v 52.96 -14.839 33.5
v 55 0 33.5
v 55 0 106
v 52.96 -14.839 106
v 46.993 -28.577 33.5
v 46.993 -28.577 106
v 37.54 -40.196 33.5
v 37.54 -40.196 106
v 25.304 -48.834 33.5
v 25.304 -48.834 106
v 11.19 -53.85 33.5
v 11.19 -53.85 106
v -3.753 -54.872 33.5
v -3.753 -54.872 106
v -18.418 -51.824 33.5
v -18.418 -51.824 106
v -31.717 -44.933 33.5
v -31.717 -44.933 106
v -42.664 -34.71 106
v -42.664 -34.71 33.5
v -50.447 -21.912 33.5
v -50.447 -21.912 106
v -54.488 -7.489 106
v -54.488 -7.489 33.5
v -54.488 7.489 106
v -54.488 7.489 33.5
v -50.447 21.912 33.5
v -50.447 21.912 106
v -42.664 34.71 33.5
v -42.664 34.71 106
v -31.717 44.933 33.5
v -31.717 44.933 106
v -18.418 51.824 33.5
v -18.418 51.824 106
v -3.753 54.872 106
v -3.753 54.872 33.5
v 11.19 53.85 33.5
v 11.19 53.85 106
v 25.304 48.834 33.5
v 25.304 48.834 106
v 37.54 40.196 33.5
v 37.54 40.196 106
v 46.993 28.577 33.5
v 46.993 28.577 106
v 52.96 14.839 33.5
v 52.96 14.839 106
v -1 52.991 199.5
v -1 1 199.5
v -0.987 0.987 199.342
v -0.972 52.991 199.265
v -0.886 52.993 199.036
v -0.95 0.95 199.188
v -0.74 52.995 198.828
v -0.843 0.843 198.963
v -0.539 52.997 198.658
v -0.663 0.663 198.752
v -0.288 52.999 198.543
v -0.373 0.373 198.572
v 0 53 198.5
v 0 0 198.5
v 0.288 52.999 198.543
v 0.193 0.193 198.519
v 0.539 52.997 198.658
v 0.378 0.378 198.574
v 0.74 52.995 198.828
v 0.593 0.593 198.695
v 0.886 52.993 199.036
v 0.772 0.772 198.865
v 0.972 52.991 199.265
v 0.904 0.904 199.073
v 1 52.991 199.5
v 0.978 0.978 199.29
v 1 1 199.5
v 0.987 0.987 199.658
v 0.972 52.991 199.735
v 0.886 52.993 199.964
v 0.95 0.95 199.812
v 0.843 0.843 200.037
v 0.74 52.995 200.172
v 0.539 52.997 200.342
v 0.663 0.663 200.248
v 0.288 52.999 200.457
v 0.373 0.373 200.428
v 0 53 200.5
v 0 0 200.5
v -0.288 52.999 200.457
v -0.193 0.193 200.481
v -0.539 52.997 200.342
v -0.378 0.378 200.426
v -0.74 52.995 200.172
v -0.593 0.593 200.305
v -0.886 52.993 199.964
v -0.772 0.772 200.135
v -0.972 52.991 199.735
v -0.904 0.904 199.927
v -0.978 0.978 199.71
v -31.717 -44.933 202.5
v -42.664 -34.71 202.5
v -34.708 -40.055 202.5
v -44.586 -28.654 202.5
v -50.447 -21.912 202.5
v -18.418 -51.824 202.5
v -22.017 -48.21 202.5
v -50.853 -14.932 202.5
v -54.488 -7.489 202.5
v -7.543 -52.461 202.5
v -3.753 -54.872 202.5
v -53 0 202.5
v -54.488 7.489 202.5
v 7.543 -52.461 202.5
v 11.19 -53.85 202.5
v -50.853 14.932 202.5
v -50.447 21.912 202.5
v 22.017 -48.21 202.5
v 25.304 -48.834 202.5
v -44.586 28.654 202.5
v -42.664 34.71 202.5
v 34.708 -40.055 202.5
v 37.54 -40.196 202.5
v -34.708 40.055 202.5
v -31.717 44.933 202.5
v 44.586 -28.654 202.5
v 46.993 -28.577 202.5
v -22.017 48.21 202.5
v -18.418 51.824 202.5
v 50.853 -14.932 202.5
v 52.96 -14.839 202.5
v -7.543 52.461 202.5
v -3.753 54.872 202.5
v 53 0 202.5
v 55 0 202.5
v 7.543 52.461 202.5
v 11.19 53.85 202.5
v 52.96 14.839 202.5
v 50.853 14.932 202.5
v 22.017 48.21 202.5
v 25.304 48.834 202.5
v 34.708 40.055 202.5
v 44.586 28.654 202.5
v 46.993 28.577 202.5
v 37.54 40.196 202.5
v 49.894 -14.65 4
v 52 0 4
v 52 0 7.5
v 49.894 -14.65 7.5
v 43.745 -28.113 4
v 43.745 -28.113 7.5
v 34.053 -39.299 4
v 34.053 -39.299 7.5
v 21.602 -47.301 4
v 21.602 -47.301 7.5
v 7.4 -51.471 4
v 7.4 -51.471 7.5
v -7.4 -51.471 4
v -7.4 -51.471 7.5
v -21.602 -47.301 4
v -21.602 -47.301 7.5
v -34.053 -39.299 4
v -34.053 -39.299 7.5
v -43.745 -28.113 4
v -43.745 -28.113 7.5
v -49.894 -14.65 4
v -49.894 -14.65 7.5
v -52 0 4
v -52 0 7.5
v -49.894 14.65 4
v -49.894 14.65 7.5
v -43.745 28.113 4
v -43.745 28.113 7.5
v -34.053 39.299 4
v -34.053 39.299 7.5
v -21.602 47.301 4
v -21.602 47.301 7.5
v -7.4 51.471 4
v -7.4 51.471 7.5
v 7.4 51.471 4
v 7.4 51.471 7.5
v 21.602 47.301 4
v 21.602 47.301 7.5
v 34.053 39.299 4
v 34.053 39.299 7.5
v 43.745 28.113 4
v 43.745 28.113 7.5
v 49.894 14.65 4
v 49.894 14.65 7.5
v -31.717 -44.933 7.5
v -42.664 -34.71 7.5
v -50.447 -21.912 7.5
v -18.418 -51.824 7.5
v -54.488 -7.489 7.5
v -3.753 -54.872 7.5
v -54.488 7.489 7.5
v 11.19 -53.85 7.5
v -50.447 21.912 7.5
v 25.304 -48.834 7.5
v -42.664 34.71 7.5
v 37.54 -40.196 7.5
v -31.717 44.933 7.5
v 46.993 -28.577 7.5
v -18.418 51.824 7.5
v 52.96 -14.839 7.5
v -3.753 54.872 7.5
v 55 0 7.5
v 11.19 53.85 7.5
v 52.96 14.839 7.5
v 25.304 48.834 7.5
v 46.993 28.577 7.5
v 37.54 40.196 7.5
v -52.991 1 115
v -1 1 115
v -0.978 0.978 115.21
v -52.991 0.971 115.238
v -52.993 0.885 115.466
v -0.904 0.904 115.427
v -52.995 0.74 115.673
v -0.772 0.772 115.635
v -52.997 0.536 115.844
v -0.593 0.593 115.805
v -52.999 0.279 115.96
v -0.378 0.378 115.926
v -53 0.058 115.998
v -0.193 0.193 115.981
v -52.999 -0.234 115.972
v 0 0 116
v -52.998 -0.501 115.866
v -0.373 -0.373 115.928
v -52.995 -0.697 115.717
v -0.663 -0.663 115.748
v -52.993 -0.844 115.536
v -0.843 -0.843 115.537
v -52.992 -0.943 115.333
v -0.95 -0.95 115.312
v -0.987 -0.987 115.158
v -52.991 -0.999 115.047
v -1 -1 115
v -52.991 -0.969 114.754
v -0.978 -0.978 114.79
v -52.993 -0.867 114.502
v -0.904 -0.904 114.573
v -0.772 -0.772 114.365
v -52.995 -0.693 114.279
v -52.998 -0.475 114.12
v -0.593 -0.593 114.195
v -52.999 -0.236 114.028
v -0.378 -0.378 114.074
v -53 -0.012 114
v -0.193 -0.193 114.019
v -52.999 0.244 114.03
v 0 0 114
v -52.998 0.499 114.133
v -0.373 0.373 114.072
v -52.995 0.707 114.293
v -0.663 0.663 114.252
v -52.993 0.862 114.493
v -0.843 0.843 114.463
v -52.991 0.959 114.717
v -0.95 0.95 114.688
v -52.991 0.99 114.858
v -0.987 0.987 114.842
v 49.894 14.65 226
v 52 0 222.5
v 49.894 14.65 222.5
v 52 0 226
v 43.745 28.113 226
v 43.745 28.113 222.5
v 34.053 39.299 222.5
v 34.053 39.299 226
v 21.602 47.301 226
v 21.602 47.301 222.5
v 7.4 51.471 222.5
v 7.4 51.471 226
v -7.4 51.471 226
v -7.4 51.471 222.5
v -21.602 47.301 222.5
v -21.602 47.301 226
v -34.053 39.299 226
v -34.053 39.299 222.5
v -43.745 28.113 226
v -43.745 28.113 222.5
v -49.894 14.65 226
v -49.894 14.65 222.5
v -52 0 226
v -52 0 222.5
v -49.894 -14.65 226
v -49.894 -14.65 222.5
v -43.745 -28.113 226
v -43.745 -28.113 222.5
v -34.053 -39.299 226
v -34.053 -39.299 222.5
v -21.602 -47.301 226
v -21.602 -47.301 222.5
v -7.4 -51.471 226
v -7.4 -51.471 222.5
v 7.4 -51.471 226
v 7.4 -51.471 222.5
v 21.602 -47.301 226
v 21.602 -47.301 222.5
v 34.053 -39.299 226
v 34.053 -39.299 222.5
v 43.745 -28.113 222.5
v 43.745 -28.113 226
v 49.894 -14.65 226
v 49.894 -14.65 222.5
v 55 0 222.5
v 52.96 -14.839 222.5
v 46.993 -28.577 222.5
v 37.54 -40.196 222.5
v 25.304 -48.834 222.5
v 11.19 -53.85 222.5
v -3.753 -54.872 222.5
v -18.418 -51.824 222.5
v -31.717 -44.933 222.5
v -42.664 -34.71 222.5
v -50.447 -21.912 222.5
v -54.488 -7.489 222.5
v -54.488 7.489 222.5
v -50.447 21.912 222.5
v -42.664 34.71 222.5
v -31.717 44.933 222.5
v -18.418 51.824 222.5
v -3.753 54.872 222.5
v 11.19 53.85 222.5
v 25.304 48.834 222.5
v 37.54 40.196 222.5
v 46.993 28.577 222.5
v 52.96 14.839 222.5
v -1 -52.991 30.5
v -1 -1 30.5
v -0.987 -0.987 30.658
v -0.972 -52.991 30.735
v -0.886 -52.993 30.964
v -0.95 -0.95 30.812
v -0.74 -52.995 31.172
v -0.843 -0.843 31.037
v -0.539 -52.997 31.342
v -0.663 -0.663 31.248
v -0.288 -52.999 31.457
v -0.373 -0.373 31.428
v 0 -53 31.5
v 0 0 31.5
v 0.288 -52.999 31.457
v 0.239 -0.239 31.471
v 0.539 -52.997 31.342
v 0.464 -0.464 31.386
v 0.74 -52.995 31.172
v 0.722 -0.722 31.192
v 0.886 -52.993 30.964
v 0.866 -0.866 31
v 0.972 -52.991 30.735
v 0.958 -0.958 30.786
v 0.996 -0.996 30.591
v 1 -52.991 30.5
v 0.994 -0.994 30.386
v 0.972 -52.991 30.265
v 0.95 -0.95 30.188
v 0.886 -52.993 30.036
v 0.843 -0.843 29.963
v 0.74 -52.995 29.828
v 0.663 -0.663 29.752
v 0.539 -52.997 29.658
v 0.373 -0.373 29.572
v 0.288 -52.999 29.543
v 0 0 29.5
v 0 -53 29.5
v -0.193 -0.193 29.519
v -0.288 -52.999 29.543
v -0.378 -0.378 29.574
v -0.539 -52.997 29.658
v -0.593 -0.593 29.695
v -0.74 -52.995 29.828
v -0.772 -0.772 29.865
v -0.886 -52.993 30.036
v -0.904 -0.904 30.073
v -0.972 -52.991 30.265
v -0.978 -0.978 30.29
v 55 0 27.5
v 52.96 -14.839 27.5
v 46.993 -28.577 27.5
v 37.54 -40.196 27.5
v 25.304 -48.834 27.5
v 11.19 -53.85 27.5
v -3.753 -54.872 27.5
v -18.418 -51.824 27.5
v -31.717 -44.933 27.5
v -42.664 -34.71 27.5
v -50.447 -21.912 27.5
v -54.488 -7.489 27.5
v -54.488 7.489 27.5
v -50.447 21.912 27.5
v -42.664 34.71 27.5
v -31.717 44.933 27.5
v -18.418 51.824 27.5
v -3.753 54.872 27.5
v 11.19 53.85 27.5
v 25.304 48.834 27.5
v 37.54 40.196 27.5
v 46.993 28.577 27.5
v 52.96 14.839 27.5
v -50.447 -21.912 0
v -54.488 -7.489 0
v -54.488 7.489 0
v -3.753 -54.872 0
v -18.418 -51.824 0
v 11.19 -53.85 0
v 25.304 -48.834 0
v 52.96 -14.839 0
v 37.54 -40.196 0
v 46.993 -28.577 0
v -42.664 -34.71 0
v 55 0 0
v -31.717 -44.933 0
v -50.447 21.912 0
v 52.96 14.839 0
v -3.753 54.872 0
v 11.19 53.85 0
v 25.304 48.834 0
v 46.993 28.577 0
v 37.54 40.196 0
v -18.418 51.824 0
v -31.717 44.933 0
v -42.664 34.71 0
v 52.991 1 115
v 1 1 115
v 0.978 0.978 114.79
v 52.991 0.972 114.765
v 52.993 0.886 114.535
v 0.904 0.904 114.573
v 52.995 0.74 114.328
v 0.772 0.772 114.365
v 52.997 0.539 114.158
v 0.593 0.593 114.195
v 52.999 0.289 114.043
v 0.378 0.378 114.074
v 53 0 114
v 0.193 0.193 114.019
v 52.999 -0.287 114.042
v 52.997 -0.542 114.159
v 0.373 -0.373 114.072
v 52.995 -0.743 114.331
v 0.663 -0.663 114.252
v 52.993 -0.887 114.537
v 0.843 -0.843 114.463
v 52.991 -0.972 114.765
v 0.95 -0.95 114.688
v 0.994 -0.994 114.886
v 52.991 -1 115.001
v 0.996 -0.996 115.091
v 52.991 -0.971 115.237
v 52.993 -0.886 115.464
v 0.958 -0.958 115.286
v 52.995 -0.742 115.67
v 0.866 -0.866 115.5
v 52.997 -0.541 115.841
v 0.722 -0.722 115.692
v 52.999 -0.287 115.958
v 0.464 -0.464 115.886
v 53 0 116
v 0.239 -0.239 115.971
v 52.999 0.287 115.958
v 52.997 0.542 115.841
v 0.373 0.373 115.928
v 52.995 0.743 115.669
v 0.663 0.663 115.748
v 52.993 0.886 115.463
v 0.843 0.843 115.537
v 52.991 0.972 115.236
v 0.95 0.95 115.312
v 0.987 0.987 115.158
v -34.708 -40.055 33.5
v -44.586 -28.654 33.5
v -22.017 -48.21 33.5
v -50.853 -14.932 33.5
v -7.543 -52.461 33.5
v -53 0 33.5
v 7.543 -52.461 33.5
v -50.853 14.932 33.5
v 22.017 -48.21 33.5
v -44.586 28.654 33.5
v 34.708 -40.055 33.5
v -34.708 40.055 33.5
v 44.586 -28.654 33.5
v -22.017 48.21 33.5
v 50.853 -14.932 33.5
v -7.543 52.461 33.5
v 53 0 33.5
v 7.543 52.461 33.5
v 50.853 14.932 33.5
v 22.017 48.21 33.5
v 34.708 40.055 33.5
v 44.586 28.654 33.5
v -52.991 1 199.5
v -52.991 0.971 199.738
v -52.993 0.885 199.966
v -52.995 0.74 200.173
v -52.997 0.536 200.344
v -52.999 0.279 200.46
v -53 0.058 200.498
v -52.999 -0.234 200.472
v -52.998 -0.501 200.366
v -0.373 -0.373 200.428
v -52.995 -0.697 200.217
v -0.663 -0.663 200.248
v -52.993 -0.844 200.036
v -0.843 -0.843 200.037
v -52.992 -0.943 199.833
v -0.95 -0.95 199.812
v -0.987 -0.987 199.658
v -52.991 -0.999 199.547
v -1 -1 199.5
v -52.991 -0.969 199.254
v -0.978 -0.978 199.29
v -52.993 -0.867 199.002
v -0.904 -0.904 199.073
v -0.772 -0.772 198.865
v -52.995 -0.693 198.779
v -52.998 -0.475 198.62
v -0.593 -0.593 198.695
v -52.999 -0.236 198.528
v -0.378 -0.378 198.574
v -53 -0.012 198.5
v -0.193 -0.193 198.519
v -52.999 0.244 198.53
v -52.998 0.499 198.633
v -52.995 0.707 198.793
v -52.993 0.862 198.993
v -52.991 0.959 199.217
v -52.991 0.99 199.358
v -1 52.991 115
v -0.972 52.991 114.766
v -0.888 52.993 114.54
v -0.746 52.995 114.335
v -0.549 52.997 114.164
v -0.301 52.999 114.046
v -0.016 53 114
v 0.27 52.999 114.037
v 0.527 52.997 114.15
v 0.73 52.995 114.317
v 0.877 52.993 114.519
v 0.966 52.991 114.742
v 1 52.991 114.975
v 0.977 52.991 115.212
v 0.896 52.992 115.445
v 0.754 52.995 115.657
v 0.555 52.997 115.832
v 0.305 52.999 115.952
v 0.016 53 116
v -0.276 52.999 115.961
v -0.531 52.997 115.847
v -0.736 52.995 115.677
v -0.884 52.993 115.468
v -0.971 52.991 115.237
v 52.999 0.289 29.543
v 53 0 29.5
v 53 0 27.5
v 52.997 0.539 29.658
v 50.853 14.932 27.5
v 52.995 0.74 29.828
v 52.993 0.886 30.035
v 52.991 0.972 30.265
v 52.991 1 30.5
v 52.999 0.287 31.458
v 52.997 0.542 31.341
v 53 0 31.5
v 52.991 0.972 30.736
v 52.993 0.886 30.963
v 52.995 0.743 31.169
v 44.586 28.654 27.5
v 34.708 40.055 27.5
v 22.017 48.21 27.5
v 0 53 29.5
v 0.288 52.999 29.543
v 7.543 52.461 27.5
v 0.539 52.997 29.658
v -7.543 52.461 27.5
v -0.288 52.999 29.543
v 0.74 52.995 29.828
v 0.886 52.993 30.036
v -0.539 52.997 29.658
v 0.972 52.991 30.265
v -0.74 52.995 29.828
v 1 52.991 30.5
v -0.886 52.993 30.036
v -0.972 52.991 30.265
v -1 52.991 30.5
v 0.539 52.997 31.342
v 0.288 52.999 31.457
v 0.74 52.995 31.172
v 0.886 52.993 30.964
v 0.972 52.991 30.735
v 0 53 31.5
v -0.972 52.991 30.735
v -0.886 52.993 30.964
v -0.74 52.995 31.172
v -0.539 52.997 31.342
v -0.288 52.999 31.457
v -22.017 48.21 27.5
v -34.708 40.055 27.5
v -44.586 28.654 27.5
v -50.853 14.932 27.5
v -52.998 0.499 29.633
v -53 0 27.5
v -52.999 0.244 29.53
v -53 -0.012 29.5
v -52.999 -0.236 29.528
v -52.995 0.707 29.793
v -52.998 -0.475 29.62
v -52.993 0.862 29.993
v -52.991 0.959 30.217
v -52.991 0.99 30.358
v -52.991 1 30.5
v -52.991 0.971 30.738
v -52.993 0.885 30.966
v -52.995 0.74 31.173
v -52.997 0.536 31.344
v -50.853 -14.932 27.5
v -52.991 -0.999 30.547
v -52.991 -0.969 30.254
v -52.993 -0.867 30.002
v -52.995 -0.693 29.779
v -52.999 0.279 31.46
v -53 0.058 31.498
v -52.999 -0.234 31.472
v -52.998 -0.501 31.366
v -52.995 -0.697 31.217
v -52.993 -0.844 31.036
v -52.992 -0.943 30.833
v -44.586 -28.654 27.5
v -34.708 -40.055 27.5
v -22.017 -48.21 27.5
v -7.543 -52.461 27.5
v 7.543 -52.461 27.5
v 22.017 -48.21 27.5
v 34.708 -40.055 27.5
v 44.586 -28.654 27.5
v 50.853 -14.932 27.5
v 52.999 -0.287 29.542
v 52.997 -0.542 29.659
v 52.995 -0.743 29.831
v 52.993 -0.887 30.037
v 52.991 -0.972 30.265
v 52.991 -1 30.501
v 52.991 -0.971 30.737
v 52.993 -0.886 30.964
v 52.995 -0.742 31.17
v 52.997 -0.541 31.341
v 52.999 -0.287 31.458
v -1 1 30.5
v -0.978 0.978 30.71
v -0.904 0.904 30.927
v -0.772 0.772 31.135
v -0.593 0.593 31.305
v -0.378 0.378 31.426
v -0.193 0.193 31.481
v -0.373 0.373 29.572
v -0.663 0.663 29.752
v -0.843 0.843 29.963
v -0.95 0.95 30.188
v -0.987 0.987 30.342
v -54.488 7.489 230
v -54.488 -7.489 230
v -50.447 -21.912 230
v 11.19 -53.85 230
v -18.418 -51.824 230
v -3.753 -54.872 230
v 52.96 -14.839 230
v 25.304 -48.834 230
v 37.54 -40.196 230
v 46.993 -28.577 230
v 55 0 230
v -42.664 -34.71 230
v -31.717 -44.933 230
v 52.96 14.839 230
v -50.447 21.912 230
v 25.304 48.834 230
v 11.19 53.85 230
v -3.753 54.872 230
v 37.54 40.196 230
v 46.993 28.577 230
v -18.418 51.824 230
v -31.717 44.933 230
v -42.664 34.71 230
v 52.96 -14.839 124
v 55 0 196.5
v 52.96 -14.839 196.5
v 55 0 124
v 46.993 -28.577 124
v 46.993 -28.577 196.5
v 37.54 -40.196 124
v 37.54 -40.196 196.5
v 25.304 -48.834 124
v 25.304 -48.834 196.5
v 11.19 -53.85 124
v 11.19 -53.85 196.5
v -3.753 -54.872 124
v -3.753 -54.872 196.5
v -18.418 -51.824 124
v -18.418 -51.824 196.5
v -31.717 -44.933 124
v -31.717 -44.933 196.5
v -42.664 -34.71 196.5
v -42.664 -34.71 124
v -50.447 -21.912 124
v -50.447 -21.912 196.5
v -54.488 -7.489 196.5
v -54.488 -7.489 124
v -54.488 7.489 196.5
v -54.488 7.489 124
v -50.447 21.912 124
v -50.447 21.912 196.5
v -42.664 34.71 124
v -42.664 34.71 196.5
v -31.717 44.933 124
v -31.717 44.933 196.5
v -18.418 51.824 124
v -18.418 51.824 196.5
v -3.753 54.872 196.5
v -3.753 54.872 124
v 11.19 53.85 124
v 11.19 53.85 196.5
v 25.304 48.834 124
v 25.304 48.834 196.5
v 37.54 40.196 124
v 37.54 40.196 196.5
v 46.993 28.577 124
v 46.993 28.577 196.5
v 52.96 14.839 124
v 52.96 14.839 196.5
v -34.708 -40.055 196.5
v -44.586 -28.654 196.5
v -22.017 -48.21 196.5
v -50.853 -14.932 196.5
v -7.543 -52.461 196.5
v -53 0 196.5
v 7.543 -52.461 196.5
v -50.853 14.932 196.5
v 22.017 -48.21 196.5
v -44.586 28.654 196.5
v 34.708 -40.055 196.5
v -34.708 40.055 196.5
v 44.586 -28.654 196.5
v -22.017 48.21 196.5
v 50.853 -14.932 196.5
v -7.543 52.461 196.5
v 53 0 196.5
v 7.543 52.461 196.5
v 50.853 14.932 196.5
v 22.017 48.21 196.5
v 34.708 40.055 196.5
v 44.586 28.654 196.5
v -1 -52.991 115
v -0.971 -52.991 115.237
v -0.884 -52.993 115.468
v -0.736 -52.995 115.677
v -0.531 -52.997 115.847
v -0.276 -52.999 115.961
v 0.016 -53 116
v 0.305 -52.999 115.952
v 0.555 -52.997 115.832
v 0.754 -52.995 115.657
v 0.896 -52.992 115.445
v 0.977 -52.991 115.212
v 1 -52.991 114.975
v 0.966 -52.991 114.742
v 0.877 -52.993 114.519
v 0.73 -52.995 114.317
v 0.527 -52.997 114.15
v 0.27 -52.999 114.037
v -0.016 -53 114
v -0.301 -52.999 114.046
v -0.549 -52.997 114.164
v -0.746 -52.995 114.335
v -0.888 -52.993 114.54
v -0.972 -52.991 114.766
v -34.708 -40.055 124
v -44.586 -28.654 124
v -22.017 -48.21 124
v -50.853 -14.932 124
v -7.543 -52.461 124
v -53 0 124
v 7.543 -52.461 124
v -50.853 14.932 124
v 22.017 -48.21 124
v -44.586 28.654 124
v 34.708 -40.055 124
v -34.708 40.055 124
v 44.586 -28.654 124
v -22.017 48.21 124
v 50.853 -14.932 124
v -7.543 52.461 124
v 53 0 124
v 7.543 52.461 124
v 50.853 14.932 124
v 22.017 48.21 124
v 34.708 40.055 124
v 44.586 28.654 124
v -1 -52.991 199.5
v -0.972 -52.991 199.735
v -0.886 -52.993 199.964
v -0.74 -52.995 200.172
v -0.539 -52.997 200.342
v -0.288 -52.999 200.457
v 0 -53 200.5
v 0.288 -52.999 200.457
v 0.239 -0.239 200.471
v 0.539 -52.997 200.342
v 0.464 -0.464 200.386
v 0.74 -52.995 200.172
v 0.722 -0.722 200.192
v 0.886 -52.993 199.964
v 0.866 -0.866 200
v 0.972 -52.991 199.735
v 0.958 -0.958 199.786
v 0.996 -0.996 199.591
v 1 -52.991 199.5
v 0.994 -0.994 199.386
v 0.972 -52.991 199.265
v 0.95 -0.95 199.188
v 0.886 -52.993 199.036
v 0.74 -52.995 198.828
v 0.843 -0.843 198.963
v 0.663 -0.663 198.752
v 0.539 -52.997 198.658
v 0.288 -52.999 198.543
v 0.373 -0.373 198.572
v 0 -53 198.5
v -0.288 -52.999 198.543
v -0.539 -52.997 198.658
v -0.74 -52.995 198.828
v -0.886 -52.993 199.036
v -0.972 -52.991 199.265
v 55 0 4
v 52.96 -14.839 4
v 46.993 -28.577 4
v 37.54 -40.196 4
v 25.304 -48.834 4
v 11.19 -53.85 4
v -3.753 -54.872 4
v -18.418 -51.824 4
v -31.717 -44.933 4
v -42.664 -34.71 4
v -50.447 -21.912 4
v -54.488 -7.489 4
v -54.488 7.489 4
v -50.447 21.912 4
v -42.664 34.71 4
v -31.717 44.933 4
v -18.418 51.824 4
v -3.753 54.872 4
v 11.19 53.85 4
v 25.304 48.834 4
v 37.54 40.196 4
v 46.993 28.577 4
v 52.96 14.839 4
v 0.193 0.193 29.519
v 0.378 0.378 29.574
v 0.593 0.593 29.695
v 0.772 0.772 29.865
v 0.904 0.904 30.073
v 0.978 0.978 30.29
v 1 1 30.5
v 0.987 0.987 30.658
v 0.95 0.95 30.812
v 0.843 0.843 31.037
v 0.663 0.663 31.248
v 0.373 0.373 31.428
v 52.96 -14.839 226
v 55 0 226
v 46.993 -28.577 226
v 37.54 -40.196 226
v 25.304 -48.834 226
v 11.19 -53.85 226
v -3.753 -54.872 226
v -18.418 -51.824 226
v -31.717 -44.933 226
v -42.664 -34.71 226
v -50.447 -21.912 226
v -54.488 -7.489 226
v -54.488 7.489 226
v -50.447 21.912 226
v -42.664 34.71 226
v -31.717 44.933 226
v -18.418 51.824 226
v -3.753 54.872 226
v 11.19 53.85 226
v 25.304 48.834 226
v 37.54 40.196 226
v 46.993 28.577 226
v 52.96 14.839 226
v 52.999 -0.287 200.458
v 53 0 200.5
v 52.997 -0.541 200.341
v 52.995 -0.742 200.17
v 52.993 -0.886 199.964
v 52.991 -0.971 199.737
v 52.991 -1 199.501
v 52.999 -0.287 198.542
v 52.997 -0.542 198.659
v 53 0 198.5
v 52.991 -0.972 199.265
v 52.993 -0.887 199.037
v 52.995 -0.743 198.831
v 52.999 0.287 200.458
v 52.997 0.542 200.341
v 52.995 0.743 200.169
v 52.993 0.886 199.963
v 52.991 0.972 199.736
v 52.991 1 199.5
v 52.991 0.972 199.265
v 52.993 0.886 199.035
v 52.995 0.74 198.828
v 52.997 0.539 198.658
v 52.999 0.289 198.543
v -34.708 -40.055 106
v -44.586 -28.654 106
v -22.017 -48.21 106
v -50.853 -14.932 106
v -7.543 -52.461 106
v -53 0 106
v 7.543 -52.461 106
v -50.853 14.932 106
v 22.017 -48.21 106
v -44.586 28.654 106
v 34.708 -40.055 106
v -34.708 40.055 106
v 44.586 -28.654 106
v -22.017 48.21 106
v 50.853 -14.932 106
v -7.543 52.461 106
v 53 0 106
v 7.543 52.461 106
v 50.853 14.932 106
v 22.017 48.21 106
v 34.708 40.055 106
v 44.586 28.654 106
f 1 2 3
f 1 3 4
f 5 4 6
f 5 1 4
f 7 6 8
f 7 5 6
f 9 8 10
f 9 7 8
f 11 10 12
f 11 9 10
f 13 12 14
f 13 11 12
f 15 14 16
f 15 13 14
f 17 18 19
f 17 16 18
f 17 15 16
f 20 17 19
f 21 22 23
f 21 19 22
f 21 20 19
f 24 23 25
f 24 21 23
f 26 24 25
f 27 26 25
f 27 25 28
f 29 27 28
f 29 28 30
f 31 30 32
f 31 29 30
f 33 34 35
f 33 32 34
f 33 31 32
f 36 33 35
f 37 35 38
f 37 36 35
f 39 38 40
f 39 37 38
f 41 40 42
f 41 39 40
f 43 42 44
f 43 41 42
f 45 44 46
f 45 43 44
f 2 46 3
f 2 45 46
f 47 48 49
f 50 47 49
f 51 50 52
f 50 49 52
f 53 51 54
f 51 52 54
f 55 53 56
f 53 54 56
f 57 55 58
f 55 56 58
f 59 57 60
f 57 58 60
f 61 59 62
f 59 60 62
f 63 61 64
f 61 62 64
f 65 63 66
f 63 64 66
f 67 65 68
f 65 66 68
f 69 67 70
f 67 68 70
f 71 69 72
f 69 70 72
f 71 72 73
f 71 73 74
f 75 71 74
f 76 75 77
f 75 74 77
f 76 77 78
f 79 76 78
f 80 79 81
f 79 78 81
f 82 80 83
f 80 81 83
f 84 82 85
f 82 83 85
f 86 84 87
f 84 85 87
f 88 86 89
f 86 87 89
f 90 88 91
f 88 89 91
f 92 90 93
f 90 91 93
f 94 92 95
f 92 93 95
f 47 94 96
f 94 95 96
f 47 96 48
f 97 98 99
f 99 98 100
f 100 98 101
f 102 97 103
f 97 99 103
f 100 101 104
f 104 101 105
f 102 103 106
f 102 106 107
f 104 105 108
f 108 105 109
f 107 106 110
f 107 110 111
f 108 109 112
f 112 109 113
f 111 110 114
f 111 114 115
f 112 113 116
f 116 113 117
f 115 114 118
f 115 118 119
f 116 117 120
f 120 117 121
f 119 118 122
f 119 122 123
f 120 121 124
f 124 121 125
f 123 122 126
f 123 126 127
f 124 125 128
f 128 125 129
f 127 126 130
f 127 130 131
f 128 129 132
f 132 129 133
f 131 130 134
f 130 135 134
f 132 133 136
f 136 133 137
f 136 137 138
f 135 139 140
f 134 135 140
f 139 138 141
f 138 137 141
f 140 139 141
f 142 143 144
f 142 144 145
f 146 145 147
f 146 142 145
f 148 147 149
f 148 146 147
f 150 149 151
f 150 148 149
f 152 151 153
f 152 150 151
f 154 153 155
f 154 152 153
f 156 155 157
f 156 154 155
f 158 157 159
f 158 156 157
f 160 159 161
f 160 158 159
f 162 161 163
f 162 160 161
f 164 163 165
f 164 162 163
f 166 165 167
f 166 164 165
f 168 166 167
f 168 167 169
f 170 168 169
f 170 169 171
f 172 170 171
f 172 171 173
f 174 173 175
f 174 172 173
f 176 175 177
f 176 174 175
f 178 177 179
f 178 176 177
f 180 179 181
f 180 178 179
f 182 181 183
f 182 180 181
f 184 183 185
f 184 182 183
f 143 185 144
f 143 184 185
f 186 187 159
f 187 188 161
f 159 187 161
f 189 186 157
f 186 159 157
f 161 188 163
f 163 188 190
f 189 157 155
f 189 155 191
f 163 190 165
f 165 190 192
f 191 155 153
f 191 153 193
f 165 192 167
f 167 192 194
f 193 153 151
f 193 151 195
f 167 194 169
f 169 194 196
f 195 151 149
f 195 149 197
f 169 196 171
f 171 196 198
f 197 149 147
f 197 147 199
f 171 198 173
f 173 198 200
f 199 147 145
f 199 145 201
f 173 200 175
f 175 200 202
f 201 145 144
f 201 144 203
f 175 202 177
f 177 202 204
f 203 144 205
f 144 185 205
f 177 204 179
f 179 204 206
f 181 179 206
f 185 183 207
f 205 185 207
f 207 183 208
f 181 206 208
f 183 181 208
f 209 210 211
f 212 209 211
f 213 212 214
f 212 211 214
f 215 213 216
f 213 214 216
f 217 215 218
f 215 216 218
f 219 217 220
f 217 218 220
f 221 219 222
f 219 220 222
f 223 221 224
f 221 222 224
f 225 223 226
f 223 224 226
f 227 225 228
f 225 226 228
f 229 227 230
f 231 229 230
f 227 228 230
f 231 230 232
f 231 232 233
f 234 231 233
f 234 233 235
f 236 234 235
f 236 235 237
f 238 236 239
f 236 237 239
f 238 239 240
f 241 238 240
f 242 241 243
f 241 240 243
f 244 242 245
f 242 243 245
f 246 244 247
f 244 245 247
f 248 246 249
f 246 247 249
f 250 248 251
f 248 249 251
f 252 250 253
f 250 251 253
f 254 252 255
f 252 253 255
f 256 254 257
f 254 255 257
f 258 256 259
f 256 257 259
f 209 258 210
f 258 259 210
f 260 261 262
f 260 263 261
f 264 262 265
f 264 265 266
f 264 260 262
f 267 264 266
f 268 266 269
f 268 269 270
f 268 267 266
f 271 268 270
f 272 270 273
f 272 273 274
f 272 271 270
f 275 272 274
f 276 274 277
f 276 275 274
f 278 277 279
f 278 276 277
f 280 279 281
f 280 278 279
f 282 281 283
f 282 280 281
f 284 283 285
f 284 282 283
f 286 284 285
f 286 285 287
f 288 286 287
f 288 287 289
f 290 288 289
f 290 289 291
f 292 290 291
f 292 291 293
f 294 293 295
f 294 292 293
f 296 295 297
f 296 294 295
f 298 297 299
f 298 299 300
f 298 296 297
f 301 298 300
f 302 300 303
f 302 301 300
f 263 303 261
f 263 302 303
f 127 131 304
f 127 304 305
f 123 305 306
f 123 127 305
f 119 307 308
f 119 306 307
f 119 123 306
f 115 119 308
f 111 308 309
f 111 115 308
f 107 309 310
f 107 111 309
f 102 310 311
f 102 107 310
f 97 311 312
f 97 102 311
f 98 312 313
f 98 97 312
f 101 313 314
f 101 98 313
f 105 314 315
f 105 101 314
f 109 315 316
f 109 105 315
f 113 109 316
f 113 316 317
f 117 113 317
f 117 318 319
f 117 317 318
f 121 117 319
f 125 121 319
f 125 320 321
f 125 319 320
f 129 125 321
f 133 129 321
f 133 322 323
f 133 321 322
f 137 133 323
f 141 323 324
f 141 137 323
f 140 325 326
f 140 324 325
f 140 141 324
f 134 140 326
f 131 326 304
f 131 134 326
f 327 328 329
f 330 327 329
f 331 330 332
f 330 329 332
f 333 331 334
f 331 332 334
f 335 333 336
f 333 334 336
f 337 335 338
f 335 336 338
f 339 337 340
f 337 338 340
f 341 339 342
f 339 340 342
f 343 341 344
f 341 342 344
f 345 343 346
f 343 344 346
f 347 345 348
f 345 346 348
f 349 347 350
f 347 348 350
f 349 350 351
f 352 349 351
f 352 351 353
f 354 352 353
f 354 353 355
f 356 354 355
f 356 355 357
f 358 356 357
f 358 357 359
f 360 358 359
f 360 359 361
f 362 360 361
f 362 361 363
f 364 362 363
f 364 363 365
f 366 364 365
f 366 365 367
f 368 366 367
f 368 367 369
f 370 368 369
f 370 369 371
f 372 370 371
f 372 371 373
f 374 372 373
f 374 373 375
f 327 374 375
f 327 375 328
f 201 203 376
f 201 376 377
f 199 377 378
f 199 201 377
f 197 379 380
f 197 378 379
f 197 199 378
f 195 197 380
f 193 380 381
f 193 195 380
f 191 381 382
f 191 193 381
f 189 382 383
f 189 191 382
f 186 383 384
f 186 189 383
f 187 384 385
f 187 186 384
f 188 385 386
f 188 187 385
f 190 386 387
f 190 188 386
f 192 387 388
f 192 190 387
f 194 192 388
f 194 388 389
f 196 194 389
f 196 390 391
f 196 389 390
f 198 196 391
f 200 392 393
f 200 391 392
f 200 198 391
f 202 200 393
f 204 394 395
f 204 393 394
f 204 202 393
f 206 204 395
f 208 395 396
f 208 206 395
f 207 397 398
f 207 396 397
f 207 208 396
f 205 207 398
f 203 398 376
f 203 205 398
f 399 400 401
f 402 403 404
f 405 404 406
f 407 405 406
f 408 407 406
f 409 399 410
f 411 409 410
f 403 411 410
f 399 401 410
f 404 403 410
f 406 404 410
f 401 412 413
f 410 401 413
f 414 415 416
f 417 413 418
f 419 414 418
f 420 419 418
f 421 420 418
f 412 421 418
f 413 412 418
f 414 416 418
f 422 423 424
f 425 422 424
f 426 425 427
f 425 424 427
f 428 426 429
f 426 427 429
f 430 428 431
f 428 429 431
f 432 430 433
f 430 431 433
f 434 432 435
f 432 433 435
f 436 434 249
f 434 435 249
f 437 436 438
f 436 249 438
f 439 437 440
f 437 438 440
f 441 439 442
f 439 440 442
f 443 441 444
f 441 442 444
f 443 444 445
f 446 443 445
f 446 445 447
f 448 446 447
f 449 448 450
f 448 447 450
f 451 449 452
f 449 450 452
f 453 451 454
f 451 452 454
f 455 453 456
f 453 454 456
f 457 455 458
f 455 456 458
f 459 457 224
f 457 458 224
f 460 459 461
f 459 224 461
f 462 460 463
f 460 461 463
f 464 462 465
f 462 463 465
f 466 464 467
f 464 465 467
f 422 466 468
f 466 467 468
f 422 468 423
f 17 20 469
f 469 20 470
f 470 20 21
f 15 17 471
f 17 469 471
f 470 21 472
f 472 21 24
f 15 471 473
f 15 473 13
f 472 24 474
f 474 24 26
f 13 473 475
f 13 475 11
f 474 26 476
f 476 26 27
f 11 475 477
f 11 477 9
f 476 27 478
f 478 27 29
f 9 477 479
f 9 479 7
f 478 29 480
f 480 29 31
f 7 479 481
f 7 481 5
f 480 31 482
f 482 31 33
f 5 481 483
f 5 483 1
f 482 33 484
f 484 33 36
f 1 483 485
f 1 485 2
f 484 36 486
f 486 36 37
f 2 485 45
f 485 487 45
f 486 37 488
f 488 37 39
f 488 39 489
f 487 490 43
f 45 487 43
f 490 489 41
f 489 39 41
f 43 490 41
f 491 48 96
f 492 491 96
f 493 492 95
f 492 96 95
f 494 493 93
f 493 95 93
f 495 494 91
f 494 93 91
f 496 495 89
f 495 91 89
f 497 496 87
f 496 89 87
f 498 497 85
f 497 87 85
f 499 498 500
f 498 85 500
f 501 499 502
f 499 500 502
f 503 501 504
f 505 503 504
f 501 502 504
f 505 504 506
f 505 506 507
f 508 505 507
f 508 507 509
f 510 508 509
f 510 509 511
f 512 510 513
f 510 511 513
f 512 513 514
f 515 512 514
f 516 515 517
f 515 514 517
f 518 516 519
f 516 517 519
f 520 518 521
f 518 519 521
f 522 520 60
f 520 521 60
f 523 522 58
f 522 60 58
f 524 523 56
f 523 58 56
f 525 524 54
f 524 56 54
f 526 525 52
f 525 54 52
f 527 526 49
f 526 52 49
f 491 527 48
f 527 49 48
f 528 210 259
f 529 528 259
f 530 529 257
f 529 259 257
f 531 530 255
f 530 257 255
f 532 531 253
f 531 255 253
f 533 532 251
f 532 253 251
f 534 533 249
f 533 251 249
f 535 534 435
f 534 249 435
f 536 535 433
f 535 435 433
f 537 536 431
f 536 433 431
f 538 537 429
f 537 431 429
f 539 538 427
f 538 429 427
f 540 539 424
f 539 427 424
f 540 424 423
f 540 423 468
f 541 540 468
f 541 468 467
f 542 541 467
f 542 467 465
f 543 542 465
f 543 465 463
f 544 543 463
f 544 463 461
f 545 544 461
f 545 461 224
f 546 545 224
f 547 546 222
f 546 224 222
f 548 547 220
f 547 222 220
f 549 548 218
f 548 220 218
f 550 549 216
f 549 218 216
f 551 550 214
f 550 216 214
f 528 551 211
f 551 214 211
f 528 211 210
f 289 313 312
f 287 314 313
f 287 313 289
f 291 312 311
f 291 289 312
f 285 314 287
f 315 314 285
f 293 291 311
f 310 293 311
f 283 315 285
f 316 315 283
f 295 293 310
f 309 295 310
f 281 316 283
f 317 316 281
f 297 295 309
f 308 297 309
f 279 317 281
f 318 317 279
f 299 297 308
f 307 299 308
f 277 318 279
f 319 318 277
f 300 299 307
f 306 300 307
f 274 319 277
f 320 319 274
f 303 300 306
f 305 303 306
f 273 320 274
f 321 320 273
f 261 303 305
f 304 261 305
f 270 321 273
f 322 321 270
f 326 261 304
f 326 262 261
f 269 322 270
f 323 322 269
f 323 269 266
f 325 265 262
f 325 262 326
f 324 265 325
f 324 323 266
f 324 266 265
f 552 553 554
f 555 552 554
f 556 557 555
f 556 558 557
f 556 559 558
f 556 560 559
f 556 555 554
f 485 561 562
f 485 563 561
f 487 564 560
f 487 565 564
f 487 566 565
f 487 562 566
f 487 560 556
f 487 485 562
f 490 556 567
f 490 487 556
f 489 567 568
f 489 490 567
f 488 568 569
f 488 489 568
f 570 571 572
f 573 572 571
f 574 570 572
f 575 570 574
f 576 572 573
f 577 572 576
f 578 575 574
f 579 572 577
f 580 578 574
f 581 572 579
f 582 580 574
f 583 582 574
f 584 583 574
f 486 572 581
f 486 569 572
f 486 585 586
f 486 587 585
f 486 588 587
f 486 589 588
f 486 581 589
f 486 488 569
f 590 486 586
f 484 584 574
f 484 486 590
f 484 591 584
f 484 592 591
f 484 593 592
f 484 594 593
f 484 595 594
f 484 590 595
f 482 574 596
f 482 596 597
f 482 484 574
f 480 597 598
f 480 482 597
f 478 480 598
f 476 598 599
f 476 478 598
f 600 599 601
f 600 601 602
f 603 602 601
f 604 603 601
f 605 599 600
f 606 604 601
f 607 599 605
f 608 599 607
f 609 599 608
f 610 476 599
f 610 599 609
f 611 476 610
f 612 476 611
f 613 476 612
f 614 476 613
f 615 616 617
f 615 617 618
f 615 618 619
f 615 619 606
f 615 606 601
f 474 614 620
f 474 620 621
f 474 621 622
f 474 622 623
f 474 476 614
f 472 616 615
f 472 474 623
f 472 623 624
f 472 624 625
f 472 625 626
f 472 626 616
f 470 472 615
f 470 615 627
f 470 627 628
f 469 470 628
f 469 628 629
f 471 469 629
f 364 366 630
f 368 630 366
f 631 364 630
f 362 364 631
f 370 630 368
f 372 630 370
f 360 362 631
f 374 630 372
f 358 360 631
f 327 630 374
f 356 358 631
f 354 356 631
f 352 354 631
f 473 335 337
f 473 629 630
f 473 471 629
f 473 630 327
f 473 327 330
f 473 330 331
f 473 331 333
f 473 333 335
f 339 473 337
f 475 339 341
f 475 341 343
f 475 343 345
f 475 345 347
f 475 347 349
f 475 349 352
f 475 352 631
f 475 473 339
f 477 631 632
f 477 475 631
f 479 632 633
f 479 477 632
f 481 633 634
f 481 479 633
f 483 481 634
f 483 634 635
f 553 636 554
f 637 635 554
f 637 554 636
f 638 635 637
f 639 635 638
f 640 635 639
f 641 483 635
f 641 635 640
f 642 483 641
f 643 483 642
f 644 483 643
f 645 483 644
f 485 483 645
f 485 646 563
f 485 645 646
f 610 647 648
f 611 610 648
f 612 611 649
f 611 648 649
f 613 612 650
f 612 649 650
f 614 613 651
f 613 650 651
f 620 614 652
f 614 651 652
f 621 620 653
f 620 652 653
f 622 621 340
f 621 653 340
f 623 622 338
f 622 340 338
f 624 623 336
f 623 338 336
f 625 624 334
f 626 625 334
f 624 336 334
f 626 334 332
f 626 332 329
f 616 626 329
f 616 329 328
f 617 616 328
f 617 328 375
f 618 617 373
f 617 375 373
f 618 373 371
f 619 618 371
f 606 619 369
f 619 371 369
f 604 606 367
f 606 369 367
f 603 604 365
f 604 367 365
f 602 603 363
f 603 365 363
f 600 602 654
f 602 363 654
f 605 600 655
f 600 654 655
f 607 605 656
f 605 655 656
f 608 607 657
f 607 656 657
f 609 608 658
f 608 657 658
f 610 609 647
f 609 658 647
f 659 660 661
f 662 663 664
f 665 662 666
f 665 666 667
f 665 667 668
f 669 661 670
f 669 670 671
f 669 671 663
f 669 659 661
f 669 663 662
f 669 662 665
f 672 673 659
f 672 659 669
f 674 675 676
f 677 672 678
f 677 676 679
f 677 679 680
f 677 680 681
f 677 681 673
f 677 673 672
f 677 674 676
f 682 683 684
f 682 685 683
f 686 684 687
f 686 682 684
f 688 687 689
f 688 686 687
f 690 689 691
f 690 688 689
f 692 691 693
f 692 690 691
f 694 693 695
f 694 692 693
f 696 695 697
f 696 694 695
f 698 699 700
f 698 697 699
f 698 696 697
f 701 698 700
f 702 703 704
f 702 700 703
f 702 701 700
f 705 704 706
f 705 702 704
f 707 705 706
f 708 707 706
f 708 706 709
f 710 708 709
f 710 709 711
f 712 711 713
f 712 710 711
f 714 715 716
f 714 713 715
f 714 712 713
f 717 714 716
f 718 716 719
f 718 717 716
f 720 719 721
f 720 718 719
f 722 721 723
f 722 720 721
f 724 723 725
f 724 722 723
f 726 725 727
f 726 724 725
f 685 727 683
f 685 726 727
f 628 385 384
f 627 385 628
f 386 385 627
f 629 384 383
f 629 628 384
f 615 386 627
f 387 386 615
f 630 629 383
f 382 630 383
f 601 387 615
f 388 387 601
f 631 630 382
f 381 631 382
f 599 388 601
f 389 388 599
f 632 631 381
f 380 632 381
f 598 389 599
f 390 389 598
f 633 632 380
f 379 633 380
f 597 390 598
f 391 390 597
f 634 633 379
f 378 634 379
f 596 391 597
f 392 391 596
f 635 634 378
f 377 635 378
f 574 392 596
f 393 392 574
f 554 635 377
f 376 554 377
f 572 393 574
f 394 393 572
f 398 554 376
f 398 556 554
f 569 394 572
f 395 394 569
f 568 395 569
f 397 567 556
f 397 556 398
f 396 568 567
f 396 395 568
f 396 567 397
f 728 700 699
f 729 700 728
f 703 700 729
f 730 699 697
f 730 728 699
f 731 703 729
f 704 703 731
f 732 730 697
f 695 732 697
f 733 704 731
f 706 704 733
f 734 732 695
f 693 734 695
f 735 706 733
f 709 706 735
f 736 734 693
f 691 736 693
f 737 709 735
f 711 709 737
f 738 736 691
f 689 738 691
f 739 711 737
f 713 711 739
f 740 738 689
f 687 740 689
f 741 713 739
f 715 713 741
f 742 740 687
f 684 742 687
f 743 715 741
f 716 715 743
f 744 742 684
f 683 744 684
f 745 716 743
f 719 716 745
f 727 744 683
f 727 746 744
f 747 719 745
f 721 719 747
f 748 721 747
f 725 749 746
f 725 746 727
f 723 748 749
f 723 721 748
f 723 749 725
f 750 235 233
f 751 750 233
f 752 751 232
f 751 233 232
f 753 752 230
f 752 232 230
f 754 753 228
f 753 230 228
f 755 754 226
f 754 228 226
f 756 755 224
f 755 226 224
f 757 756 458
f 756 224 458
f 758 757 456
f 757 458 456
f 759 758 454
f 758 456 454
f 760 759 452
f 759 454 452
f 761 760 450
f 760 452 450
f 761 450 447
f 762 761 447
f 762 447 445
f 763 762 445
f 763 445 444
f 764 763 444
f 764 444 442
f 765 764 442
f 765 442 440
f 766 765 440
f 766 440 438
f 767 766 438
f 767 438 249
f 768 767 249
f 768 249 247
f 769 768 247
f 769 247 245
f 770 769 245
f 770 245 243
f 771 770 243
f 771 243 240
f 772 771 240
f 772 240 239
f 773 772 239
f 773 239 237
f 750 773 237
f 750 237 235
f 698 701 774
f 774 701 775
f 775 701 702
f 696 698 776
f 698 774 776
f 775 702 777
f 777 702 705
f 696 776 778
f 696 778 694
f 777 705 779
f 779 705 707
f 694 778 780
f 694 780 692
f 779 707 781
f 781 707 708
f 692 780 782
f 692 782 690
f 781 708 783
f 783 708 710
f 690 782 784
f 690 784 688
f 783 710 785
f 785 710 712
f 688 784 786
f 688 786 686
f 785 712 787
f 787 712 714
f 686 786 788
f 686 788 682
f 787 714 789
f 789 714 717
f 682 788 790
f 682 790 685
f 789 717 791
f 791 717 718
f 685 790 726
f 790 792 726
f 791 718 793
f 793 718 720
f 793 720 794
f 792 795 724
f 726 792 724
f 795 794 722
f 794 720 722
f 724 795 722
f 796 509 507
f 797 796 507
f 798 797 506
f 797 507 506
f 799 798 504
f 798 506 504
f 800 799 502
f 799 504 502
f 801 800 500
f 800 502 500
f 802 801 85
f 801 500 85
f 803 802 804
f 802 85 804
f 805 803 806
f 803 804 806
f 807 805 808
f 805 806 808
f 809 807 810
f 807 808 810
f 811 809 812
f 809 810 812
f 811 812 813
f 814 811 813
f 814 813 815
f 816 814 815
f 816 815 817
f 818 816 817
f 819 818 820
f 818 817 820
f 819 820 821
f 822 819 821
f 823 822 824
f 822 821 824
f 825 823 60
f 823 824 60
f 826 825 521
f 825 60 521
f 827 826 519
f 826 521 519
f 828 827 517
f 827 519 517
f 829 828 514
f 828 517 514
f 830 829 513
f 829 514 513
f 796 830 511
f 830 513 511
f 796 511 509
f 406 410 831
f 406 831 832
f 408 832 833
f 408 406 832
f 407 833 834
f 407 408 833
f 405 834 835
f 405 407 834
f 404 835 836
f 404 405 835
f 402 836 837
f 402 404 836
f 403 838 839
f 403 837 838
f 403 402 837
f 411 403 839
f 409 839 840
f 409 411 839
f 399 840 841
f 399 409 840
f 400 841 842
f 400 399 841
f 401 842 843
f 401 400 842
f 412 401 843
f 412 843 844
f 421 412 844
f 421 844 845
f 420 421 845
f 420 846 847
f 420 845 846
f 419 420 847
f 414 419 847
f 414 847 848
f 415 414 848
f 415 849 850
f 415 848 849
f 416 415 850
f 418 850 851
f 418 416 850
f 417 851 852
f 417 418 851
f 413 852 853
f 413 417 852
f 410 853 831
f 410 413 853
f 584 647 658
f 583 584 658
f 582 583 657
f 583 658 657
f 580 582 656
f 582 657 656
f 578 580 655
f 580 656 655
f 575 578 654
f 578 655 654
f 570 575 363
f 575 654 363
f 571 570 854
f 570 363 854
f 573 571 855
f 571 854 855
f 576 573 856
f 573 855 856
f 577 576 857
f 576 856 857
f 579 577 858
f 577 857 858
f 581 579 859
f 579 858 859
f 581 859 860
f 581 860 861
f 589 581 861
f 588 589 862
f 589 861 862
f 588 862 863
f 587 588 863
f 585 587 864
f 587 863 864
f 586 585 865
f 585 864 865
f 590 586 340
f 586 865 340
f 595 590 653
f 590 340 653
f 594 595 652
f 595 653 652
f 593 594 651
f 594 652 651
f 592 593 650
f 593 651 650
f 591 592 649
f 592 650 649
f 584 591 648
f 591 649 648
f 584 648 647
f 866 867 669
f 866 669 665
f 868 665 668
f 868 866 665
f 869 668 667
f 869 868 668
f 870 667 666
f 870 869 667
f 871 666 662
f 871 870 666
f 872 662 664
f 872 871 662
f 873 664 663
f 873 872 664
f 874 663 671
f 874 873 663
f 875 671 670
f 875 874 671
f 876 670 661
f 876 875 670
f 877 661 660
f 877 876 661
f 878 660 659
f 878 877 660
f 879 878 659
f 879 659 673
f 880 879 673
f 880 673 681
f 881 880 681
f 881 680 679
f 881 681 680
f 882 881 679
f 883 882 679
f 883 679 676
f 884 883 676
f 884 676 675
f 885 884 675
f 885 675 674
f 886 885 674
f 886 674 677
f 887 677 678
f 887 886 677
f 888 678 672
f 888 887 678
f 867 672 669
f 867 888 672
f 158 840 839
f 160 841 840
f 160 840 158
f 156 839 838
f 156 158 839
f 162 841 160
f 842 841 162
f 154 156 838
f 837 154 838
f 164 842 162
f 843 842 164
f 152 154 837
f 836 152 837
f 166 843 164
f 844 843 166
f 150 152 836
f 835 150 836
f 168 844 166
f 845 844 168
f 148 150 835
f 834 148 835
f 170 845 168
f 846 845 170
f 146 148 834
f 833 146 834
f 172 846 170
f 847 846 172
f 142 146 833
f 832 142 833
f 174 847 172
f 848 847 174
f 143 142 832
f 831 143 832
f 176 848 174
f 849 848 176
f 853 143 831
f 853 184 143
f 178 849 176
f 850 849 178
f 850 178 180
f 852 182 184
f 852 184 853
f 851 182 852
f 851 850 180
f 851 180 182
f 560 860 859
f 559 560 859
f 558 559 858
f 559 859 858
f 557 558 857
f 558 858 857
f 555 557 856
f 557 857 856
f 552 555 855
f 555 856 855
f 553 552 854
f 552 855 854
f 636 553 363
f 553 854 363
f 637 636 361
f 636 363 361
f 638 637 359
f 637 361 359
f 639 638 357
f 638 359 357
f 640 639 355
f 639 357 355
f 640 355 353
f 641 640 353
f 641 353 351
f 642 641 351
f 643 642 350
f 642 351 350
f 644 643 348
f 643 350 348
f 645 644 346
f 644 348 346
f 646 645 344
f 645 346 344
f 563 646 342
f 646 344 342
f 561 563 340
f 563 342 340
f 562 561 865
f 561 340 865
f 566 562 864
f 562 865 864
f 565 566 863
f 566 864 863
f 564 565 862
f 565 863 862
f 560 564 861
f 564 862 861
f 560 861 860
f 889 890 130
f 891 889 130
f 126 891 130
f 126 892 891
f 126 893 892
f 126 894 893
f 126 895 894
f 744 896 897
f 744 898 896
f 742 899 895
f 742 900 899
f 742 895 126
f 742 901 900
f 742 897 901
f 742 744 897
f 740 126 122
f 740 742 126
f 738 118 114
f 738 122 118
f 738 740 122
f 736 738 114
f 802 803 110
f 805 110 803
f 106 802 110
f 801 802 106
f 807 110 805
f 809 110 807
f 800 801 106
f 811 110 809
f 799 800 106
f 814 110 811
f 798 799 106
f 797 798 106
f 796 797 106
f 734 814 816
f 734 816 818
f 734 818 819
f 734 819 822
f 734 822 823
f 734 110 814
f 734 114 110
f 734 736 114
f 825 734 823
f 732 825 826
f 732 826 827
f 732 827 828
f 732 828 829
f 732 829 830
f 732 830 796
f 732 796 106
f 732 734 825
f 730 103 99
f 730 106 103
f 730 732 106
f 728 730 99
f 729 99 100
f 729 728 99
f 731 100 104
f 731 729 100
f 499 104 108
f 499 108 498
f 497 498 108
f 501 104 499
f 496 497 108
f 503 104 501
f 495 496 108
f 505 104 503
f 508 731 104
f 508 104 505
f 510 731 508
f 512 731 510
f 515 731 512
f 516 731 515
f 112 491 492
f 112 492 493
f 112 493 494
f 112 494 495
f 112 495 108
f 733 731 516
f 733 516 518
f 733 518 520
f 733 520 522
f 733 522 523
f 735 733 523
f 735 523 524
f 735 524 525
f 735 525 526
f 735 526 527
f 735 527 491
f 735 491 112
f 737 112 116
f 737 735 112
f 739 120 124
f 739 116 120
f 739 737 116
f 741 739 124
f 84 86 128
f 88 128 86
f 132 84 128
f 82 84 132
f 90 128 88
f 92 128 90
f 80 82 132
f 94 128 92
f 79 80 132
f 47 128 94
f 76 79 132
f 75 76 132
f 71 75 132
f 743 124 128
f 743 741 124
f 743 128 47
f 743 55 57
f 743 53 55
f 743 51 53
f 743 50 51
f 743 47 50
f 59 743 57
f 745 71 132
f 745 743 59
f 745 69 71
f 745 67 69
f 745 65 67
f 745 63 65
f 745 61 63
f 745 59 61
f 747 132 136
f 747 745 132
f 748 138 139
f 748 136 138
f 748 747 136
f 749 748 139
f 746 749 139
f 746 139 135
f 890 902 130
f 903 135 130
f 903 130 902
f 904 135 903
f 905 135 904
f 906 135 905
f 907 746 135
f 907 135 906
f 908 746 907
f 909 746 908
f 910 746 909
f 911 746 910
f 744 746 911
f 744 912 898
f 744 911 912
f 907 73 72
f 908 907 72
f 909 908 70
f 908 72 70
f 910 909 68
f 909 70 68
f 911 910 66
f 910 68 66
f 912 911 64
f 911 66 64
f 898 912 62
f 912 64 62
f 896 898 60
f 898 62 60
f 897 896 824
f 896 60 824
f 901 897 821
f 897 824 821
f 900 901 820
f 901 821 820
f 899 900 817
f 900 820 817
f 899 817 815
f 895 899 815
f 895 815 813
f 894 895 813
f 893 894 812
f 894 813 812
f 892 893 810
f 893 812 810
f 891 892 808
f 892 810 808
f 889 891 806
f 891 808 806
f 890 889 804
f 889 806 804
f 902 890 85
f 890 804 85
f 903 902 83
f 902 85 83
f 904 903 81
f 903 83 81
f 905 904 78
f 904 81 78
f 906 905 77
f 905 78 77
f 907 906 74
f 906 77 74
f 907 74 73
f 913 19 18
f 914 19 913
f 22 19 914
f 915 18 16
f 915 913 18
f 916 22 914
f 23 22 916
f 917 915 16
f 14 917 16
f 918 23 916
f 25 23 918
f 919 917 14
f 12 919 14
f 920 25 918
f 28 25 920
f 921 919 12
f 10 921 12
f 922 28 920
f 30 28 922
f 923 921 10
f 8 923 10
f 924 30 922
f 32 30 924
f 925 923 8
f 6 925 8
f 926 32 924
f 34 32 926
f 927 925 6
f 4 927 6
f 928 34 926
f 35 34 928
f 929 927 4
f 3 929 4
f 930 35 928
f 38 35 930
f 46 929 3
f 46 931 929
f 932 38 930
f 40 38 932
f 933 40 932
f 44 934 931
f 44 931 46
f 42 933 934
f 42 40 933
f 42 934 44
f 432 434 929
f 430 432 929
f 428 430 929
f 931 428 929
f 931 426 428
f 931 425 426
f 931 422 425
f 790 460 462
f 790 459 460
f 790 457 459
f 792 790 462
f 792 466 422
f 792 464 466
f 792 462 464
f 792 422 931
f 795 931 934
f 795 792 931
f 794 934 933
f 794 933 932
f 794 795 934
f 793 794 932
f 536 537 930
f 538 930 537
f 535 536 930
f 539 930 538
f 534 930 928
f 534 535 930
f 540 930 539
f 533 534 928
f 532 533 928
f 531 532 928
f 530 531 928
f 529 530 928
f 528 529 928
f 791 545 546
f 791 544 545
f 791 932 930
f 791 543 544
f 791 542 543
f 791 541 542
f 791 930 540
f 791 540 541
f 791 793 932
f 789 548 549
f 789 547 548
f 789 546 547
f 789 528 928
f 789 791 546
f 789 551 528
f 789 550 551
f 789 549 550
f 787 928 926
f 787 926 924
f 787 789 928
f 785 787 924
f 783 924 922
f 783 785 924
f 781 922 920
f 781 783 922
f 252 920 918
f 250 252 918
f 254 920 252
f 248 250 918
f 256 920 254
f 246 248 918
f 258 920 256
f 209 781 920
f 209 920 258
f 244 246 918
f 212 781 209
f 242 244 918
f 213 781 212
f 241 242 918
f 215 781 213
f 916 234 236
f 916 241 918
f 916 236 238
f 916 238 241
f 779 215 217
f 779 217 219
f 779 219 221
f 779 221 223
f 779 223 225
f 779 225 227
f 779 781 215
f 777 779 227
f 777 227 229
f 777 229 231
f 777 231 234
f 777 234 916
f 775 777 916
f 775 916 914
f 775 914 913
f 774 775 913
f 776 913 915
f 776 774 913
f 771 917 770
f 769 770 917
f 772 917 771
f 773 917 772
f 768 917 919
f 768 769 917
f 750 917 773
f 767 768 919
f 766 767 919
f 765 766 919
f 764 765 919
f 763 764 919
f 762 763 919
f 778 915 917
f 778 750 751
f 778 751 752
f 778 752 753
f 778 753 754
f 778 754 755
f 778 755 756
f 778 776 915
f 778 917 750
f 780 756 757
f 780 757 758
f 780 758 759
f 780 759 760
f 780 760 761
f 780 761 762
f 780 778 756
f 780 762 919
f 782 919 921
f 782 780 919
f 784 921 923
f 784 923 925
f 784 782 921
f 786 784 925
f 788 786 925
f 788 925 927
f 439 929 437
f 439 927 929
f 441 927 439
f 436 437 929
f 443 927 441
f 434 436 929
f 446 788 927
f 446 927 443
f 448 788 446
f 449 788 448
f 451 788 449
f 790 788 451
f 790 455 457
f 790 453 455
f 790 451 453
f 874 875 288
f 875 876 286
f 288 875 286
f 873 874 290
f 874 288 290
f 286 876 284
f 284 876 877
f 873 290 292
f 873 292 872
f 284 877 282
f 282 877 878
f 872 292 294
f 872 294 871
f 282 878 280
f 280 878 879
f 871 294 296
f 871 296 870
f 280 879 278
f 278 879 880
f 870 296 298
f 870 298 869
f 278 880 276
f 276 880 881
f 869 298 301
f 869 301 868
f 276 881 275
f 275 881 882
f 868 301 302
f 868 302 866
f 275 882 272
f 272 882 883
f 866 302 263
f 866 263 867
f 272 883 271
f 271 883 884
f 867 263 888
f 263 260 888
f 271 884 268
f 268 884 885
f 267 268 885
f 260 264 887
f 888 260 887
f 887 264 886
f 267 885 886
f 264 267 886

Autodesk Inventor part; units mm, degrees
ref_plane "YZ Plane" through (0, 0, 0) normal (1, 0, 0) x (0, 1, 0)
ref_plane "XZ Plane" through (0, 0, 0) normal (0, 1, 0) x (-1, 0, 0)
ref_plane "XY Plane" through (0, 0, 0) normal (0, 0, 1) x (1, 0, 0)
sketch "Эскиз1" plane through (0, 0, 0) normal (0, 0, 1) x (1, 0, 0)
  circle A0 centre (0, 0) radius 55
  dimension "d0" = 110
extrude "Выдавливание1" add sketch "Эскиз1" along normal blind 230
sketch "Эскиз2" plane through (0, 0, 0) normal (0, 1, 0) x (-1, 0, 0)
  line L0 (55, 0) -> (-55, 0) projected
  line L1 (-55, 0) -> (-55, 230) projected
  line L2 (55, 230) -> (-55, 230) projected
  line L3 (-55, 230) -> (-55, 222.5)
  line L4 (-55, 222.5) -> (-52, 222.5)
  line L5 (-52, 222.5) -> (-52, 226)
  line L6 (-52, 226) -> (-55, 226)
  line L7 (0, -46) -> (0, 276) projected
  line L8 (-55, 0) -> (-55, 7.5)
  line L9 (-55, 0) -> (-55, 230) projected
  line L10 (-55, 7.5) -> (-52, 7.5)
  line L11 (-52, 7.5) -> (-52, 4)
  line L12 (-52, 4) -> (-55, 4)
  line L13 (-55, 0) -> (-55, 230) projected
  line L14 (-55, 7.5) -> (-55, 27.5)
  line L15 (-55, 0) -> (-55, 230) projected
  line L16 (-55, 27.5) -> (-53, 27.5)
  line L17 (-53, 27.5) -> (-53, 33.5)
  line L18 (-53, 33.5) -> (-55, 33.5)
  line L19 (-55, 0) -> (-55, 230) projected
  line L20 (-55, 222.5) -> (-55, 202.5)
  line L21 (-55, 0) -> (-55, 230) projected
  line L22 (-55, 202.5) -> (-53, 202.5)
  line L23 (-53, 202.5) -> (-53, 196.5)
  line L24 (-53, 196.5) -> (-55, 196.5)
  line L25 (-55, 0) -> (-55, 230) projected
  line L26 (-55, 0) -> (-55, 230) projected
  line L27 (-55, 55) -> (-55, 106)
  line L28 (-55, 0) -> (-55, 230) projected
  line L29 (-55, 106) -> (-53, 106)
  line L30 (-53, 106) -> (-53, 124)
  line L31 (-53, 124) -> (-55, 124)
  line L32 (-55, 0) -> (-55, 230) projected
  point P0 (0, 0)
  dimension "d3" = 7.5
  dimension "d5" = 7.5
  dimension "d6" = 3.5
  dimension "d7" = 20
  dimension "d8" = 2
  dimension "d9" = 6
  dimension "d10" = 20
  dimension "d11" = 2
  dimension "d12" = 6
  dimension "d13" = 51
  dimension "d14" = 18
revolve "Вращение1" cut sketch "Эскиз2" angle 360 about axis through (0, 0, -10) along (0, 0, 1) contours L1 L10 L11 L12 | L6 L5 L4 L1 | L1 L18 L17 L16 | L22 L23 L24 L1 | L1 L31 L30 L29
sketch "Эскиз3" plane through (0, 0, 0) normal (1, 0, 0) x (0, 1, 0)
  line L0 (-53, 27.5) -> (-53, 33.5) projected
  line L1 (-53, 33.5) -> (53, 33.5) projected
  line L2 (55, 33.5) -> (-55, 33.5) projected
  line L3 (0, 33.5) -> (0, 30.5)
  circle A0 centre (0, 30.5) radius 1
  line L4 (-53, 106) -> (53, 106) projected
  line L5 (0, 106) -> (0, 115)
  circle A1 centre (0, 115) radius 1
  line L6 (-53, 196.5) -> (53, 196.5) projected
  line L7 (0, 196.5) -> (0, 199.5)
  circle A2 centre (0, 199.5) radius 1
  point P0 (0, 0)
  dimension "d15" = 2
  dimension "d16" = 3
extrude "Выдавливание2" cut sketch "Эскиз3" against normal through all both and the other way through all
sketch "Эскиз4" plane through (0, 0, 0) normal (0, 1, 0) x (-1, 0, 0)
  line L0 (-53, 29.5) -> (53, 29.5) projected
  line L1 (0, 29.5) -> (0, 30.5)
  circle A0 centre (0, 30.5) radius 1
  line L2 (-53, 114) -> (53, 114) projected
  line L3 (0, 114) -> (0, 115)
  circle A1 centre (0, 115) radius 1
  line L4 (-53, 198.5) -> (53, 198.5) projected
  line L5 (0, 198.5) -> (0, 199.5)
  circle A2 centre (0, 199.5) radius 1
  point P0 (0, 0)
  dimension "d19" = 1
  dimension "d20" = 1
extrude "Выдавливание3" cut sketch "Эскиз4" against normal through all both and the other way through all
properties part number "Палец" material "Сталь, высокопрочная, низколегированная"
